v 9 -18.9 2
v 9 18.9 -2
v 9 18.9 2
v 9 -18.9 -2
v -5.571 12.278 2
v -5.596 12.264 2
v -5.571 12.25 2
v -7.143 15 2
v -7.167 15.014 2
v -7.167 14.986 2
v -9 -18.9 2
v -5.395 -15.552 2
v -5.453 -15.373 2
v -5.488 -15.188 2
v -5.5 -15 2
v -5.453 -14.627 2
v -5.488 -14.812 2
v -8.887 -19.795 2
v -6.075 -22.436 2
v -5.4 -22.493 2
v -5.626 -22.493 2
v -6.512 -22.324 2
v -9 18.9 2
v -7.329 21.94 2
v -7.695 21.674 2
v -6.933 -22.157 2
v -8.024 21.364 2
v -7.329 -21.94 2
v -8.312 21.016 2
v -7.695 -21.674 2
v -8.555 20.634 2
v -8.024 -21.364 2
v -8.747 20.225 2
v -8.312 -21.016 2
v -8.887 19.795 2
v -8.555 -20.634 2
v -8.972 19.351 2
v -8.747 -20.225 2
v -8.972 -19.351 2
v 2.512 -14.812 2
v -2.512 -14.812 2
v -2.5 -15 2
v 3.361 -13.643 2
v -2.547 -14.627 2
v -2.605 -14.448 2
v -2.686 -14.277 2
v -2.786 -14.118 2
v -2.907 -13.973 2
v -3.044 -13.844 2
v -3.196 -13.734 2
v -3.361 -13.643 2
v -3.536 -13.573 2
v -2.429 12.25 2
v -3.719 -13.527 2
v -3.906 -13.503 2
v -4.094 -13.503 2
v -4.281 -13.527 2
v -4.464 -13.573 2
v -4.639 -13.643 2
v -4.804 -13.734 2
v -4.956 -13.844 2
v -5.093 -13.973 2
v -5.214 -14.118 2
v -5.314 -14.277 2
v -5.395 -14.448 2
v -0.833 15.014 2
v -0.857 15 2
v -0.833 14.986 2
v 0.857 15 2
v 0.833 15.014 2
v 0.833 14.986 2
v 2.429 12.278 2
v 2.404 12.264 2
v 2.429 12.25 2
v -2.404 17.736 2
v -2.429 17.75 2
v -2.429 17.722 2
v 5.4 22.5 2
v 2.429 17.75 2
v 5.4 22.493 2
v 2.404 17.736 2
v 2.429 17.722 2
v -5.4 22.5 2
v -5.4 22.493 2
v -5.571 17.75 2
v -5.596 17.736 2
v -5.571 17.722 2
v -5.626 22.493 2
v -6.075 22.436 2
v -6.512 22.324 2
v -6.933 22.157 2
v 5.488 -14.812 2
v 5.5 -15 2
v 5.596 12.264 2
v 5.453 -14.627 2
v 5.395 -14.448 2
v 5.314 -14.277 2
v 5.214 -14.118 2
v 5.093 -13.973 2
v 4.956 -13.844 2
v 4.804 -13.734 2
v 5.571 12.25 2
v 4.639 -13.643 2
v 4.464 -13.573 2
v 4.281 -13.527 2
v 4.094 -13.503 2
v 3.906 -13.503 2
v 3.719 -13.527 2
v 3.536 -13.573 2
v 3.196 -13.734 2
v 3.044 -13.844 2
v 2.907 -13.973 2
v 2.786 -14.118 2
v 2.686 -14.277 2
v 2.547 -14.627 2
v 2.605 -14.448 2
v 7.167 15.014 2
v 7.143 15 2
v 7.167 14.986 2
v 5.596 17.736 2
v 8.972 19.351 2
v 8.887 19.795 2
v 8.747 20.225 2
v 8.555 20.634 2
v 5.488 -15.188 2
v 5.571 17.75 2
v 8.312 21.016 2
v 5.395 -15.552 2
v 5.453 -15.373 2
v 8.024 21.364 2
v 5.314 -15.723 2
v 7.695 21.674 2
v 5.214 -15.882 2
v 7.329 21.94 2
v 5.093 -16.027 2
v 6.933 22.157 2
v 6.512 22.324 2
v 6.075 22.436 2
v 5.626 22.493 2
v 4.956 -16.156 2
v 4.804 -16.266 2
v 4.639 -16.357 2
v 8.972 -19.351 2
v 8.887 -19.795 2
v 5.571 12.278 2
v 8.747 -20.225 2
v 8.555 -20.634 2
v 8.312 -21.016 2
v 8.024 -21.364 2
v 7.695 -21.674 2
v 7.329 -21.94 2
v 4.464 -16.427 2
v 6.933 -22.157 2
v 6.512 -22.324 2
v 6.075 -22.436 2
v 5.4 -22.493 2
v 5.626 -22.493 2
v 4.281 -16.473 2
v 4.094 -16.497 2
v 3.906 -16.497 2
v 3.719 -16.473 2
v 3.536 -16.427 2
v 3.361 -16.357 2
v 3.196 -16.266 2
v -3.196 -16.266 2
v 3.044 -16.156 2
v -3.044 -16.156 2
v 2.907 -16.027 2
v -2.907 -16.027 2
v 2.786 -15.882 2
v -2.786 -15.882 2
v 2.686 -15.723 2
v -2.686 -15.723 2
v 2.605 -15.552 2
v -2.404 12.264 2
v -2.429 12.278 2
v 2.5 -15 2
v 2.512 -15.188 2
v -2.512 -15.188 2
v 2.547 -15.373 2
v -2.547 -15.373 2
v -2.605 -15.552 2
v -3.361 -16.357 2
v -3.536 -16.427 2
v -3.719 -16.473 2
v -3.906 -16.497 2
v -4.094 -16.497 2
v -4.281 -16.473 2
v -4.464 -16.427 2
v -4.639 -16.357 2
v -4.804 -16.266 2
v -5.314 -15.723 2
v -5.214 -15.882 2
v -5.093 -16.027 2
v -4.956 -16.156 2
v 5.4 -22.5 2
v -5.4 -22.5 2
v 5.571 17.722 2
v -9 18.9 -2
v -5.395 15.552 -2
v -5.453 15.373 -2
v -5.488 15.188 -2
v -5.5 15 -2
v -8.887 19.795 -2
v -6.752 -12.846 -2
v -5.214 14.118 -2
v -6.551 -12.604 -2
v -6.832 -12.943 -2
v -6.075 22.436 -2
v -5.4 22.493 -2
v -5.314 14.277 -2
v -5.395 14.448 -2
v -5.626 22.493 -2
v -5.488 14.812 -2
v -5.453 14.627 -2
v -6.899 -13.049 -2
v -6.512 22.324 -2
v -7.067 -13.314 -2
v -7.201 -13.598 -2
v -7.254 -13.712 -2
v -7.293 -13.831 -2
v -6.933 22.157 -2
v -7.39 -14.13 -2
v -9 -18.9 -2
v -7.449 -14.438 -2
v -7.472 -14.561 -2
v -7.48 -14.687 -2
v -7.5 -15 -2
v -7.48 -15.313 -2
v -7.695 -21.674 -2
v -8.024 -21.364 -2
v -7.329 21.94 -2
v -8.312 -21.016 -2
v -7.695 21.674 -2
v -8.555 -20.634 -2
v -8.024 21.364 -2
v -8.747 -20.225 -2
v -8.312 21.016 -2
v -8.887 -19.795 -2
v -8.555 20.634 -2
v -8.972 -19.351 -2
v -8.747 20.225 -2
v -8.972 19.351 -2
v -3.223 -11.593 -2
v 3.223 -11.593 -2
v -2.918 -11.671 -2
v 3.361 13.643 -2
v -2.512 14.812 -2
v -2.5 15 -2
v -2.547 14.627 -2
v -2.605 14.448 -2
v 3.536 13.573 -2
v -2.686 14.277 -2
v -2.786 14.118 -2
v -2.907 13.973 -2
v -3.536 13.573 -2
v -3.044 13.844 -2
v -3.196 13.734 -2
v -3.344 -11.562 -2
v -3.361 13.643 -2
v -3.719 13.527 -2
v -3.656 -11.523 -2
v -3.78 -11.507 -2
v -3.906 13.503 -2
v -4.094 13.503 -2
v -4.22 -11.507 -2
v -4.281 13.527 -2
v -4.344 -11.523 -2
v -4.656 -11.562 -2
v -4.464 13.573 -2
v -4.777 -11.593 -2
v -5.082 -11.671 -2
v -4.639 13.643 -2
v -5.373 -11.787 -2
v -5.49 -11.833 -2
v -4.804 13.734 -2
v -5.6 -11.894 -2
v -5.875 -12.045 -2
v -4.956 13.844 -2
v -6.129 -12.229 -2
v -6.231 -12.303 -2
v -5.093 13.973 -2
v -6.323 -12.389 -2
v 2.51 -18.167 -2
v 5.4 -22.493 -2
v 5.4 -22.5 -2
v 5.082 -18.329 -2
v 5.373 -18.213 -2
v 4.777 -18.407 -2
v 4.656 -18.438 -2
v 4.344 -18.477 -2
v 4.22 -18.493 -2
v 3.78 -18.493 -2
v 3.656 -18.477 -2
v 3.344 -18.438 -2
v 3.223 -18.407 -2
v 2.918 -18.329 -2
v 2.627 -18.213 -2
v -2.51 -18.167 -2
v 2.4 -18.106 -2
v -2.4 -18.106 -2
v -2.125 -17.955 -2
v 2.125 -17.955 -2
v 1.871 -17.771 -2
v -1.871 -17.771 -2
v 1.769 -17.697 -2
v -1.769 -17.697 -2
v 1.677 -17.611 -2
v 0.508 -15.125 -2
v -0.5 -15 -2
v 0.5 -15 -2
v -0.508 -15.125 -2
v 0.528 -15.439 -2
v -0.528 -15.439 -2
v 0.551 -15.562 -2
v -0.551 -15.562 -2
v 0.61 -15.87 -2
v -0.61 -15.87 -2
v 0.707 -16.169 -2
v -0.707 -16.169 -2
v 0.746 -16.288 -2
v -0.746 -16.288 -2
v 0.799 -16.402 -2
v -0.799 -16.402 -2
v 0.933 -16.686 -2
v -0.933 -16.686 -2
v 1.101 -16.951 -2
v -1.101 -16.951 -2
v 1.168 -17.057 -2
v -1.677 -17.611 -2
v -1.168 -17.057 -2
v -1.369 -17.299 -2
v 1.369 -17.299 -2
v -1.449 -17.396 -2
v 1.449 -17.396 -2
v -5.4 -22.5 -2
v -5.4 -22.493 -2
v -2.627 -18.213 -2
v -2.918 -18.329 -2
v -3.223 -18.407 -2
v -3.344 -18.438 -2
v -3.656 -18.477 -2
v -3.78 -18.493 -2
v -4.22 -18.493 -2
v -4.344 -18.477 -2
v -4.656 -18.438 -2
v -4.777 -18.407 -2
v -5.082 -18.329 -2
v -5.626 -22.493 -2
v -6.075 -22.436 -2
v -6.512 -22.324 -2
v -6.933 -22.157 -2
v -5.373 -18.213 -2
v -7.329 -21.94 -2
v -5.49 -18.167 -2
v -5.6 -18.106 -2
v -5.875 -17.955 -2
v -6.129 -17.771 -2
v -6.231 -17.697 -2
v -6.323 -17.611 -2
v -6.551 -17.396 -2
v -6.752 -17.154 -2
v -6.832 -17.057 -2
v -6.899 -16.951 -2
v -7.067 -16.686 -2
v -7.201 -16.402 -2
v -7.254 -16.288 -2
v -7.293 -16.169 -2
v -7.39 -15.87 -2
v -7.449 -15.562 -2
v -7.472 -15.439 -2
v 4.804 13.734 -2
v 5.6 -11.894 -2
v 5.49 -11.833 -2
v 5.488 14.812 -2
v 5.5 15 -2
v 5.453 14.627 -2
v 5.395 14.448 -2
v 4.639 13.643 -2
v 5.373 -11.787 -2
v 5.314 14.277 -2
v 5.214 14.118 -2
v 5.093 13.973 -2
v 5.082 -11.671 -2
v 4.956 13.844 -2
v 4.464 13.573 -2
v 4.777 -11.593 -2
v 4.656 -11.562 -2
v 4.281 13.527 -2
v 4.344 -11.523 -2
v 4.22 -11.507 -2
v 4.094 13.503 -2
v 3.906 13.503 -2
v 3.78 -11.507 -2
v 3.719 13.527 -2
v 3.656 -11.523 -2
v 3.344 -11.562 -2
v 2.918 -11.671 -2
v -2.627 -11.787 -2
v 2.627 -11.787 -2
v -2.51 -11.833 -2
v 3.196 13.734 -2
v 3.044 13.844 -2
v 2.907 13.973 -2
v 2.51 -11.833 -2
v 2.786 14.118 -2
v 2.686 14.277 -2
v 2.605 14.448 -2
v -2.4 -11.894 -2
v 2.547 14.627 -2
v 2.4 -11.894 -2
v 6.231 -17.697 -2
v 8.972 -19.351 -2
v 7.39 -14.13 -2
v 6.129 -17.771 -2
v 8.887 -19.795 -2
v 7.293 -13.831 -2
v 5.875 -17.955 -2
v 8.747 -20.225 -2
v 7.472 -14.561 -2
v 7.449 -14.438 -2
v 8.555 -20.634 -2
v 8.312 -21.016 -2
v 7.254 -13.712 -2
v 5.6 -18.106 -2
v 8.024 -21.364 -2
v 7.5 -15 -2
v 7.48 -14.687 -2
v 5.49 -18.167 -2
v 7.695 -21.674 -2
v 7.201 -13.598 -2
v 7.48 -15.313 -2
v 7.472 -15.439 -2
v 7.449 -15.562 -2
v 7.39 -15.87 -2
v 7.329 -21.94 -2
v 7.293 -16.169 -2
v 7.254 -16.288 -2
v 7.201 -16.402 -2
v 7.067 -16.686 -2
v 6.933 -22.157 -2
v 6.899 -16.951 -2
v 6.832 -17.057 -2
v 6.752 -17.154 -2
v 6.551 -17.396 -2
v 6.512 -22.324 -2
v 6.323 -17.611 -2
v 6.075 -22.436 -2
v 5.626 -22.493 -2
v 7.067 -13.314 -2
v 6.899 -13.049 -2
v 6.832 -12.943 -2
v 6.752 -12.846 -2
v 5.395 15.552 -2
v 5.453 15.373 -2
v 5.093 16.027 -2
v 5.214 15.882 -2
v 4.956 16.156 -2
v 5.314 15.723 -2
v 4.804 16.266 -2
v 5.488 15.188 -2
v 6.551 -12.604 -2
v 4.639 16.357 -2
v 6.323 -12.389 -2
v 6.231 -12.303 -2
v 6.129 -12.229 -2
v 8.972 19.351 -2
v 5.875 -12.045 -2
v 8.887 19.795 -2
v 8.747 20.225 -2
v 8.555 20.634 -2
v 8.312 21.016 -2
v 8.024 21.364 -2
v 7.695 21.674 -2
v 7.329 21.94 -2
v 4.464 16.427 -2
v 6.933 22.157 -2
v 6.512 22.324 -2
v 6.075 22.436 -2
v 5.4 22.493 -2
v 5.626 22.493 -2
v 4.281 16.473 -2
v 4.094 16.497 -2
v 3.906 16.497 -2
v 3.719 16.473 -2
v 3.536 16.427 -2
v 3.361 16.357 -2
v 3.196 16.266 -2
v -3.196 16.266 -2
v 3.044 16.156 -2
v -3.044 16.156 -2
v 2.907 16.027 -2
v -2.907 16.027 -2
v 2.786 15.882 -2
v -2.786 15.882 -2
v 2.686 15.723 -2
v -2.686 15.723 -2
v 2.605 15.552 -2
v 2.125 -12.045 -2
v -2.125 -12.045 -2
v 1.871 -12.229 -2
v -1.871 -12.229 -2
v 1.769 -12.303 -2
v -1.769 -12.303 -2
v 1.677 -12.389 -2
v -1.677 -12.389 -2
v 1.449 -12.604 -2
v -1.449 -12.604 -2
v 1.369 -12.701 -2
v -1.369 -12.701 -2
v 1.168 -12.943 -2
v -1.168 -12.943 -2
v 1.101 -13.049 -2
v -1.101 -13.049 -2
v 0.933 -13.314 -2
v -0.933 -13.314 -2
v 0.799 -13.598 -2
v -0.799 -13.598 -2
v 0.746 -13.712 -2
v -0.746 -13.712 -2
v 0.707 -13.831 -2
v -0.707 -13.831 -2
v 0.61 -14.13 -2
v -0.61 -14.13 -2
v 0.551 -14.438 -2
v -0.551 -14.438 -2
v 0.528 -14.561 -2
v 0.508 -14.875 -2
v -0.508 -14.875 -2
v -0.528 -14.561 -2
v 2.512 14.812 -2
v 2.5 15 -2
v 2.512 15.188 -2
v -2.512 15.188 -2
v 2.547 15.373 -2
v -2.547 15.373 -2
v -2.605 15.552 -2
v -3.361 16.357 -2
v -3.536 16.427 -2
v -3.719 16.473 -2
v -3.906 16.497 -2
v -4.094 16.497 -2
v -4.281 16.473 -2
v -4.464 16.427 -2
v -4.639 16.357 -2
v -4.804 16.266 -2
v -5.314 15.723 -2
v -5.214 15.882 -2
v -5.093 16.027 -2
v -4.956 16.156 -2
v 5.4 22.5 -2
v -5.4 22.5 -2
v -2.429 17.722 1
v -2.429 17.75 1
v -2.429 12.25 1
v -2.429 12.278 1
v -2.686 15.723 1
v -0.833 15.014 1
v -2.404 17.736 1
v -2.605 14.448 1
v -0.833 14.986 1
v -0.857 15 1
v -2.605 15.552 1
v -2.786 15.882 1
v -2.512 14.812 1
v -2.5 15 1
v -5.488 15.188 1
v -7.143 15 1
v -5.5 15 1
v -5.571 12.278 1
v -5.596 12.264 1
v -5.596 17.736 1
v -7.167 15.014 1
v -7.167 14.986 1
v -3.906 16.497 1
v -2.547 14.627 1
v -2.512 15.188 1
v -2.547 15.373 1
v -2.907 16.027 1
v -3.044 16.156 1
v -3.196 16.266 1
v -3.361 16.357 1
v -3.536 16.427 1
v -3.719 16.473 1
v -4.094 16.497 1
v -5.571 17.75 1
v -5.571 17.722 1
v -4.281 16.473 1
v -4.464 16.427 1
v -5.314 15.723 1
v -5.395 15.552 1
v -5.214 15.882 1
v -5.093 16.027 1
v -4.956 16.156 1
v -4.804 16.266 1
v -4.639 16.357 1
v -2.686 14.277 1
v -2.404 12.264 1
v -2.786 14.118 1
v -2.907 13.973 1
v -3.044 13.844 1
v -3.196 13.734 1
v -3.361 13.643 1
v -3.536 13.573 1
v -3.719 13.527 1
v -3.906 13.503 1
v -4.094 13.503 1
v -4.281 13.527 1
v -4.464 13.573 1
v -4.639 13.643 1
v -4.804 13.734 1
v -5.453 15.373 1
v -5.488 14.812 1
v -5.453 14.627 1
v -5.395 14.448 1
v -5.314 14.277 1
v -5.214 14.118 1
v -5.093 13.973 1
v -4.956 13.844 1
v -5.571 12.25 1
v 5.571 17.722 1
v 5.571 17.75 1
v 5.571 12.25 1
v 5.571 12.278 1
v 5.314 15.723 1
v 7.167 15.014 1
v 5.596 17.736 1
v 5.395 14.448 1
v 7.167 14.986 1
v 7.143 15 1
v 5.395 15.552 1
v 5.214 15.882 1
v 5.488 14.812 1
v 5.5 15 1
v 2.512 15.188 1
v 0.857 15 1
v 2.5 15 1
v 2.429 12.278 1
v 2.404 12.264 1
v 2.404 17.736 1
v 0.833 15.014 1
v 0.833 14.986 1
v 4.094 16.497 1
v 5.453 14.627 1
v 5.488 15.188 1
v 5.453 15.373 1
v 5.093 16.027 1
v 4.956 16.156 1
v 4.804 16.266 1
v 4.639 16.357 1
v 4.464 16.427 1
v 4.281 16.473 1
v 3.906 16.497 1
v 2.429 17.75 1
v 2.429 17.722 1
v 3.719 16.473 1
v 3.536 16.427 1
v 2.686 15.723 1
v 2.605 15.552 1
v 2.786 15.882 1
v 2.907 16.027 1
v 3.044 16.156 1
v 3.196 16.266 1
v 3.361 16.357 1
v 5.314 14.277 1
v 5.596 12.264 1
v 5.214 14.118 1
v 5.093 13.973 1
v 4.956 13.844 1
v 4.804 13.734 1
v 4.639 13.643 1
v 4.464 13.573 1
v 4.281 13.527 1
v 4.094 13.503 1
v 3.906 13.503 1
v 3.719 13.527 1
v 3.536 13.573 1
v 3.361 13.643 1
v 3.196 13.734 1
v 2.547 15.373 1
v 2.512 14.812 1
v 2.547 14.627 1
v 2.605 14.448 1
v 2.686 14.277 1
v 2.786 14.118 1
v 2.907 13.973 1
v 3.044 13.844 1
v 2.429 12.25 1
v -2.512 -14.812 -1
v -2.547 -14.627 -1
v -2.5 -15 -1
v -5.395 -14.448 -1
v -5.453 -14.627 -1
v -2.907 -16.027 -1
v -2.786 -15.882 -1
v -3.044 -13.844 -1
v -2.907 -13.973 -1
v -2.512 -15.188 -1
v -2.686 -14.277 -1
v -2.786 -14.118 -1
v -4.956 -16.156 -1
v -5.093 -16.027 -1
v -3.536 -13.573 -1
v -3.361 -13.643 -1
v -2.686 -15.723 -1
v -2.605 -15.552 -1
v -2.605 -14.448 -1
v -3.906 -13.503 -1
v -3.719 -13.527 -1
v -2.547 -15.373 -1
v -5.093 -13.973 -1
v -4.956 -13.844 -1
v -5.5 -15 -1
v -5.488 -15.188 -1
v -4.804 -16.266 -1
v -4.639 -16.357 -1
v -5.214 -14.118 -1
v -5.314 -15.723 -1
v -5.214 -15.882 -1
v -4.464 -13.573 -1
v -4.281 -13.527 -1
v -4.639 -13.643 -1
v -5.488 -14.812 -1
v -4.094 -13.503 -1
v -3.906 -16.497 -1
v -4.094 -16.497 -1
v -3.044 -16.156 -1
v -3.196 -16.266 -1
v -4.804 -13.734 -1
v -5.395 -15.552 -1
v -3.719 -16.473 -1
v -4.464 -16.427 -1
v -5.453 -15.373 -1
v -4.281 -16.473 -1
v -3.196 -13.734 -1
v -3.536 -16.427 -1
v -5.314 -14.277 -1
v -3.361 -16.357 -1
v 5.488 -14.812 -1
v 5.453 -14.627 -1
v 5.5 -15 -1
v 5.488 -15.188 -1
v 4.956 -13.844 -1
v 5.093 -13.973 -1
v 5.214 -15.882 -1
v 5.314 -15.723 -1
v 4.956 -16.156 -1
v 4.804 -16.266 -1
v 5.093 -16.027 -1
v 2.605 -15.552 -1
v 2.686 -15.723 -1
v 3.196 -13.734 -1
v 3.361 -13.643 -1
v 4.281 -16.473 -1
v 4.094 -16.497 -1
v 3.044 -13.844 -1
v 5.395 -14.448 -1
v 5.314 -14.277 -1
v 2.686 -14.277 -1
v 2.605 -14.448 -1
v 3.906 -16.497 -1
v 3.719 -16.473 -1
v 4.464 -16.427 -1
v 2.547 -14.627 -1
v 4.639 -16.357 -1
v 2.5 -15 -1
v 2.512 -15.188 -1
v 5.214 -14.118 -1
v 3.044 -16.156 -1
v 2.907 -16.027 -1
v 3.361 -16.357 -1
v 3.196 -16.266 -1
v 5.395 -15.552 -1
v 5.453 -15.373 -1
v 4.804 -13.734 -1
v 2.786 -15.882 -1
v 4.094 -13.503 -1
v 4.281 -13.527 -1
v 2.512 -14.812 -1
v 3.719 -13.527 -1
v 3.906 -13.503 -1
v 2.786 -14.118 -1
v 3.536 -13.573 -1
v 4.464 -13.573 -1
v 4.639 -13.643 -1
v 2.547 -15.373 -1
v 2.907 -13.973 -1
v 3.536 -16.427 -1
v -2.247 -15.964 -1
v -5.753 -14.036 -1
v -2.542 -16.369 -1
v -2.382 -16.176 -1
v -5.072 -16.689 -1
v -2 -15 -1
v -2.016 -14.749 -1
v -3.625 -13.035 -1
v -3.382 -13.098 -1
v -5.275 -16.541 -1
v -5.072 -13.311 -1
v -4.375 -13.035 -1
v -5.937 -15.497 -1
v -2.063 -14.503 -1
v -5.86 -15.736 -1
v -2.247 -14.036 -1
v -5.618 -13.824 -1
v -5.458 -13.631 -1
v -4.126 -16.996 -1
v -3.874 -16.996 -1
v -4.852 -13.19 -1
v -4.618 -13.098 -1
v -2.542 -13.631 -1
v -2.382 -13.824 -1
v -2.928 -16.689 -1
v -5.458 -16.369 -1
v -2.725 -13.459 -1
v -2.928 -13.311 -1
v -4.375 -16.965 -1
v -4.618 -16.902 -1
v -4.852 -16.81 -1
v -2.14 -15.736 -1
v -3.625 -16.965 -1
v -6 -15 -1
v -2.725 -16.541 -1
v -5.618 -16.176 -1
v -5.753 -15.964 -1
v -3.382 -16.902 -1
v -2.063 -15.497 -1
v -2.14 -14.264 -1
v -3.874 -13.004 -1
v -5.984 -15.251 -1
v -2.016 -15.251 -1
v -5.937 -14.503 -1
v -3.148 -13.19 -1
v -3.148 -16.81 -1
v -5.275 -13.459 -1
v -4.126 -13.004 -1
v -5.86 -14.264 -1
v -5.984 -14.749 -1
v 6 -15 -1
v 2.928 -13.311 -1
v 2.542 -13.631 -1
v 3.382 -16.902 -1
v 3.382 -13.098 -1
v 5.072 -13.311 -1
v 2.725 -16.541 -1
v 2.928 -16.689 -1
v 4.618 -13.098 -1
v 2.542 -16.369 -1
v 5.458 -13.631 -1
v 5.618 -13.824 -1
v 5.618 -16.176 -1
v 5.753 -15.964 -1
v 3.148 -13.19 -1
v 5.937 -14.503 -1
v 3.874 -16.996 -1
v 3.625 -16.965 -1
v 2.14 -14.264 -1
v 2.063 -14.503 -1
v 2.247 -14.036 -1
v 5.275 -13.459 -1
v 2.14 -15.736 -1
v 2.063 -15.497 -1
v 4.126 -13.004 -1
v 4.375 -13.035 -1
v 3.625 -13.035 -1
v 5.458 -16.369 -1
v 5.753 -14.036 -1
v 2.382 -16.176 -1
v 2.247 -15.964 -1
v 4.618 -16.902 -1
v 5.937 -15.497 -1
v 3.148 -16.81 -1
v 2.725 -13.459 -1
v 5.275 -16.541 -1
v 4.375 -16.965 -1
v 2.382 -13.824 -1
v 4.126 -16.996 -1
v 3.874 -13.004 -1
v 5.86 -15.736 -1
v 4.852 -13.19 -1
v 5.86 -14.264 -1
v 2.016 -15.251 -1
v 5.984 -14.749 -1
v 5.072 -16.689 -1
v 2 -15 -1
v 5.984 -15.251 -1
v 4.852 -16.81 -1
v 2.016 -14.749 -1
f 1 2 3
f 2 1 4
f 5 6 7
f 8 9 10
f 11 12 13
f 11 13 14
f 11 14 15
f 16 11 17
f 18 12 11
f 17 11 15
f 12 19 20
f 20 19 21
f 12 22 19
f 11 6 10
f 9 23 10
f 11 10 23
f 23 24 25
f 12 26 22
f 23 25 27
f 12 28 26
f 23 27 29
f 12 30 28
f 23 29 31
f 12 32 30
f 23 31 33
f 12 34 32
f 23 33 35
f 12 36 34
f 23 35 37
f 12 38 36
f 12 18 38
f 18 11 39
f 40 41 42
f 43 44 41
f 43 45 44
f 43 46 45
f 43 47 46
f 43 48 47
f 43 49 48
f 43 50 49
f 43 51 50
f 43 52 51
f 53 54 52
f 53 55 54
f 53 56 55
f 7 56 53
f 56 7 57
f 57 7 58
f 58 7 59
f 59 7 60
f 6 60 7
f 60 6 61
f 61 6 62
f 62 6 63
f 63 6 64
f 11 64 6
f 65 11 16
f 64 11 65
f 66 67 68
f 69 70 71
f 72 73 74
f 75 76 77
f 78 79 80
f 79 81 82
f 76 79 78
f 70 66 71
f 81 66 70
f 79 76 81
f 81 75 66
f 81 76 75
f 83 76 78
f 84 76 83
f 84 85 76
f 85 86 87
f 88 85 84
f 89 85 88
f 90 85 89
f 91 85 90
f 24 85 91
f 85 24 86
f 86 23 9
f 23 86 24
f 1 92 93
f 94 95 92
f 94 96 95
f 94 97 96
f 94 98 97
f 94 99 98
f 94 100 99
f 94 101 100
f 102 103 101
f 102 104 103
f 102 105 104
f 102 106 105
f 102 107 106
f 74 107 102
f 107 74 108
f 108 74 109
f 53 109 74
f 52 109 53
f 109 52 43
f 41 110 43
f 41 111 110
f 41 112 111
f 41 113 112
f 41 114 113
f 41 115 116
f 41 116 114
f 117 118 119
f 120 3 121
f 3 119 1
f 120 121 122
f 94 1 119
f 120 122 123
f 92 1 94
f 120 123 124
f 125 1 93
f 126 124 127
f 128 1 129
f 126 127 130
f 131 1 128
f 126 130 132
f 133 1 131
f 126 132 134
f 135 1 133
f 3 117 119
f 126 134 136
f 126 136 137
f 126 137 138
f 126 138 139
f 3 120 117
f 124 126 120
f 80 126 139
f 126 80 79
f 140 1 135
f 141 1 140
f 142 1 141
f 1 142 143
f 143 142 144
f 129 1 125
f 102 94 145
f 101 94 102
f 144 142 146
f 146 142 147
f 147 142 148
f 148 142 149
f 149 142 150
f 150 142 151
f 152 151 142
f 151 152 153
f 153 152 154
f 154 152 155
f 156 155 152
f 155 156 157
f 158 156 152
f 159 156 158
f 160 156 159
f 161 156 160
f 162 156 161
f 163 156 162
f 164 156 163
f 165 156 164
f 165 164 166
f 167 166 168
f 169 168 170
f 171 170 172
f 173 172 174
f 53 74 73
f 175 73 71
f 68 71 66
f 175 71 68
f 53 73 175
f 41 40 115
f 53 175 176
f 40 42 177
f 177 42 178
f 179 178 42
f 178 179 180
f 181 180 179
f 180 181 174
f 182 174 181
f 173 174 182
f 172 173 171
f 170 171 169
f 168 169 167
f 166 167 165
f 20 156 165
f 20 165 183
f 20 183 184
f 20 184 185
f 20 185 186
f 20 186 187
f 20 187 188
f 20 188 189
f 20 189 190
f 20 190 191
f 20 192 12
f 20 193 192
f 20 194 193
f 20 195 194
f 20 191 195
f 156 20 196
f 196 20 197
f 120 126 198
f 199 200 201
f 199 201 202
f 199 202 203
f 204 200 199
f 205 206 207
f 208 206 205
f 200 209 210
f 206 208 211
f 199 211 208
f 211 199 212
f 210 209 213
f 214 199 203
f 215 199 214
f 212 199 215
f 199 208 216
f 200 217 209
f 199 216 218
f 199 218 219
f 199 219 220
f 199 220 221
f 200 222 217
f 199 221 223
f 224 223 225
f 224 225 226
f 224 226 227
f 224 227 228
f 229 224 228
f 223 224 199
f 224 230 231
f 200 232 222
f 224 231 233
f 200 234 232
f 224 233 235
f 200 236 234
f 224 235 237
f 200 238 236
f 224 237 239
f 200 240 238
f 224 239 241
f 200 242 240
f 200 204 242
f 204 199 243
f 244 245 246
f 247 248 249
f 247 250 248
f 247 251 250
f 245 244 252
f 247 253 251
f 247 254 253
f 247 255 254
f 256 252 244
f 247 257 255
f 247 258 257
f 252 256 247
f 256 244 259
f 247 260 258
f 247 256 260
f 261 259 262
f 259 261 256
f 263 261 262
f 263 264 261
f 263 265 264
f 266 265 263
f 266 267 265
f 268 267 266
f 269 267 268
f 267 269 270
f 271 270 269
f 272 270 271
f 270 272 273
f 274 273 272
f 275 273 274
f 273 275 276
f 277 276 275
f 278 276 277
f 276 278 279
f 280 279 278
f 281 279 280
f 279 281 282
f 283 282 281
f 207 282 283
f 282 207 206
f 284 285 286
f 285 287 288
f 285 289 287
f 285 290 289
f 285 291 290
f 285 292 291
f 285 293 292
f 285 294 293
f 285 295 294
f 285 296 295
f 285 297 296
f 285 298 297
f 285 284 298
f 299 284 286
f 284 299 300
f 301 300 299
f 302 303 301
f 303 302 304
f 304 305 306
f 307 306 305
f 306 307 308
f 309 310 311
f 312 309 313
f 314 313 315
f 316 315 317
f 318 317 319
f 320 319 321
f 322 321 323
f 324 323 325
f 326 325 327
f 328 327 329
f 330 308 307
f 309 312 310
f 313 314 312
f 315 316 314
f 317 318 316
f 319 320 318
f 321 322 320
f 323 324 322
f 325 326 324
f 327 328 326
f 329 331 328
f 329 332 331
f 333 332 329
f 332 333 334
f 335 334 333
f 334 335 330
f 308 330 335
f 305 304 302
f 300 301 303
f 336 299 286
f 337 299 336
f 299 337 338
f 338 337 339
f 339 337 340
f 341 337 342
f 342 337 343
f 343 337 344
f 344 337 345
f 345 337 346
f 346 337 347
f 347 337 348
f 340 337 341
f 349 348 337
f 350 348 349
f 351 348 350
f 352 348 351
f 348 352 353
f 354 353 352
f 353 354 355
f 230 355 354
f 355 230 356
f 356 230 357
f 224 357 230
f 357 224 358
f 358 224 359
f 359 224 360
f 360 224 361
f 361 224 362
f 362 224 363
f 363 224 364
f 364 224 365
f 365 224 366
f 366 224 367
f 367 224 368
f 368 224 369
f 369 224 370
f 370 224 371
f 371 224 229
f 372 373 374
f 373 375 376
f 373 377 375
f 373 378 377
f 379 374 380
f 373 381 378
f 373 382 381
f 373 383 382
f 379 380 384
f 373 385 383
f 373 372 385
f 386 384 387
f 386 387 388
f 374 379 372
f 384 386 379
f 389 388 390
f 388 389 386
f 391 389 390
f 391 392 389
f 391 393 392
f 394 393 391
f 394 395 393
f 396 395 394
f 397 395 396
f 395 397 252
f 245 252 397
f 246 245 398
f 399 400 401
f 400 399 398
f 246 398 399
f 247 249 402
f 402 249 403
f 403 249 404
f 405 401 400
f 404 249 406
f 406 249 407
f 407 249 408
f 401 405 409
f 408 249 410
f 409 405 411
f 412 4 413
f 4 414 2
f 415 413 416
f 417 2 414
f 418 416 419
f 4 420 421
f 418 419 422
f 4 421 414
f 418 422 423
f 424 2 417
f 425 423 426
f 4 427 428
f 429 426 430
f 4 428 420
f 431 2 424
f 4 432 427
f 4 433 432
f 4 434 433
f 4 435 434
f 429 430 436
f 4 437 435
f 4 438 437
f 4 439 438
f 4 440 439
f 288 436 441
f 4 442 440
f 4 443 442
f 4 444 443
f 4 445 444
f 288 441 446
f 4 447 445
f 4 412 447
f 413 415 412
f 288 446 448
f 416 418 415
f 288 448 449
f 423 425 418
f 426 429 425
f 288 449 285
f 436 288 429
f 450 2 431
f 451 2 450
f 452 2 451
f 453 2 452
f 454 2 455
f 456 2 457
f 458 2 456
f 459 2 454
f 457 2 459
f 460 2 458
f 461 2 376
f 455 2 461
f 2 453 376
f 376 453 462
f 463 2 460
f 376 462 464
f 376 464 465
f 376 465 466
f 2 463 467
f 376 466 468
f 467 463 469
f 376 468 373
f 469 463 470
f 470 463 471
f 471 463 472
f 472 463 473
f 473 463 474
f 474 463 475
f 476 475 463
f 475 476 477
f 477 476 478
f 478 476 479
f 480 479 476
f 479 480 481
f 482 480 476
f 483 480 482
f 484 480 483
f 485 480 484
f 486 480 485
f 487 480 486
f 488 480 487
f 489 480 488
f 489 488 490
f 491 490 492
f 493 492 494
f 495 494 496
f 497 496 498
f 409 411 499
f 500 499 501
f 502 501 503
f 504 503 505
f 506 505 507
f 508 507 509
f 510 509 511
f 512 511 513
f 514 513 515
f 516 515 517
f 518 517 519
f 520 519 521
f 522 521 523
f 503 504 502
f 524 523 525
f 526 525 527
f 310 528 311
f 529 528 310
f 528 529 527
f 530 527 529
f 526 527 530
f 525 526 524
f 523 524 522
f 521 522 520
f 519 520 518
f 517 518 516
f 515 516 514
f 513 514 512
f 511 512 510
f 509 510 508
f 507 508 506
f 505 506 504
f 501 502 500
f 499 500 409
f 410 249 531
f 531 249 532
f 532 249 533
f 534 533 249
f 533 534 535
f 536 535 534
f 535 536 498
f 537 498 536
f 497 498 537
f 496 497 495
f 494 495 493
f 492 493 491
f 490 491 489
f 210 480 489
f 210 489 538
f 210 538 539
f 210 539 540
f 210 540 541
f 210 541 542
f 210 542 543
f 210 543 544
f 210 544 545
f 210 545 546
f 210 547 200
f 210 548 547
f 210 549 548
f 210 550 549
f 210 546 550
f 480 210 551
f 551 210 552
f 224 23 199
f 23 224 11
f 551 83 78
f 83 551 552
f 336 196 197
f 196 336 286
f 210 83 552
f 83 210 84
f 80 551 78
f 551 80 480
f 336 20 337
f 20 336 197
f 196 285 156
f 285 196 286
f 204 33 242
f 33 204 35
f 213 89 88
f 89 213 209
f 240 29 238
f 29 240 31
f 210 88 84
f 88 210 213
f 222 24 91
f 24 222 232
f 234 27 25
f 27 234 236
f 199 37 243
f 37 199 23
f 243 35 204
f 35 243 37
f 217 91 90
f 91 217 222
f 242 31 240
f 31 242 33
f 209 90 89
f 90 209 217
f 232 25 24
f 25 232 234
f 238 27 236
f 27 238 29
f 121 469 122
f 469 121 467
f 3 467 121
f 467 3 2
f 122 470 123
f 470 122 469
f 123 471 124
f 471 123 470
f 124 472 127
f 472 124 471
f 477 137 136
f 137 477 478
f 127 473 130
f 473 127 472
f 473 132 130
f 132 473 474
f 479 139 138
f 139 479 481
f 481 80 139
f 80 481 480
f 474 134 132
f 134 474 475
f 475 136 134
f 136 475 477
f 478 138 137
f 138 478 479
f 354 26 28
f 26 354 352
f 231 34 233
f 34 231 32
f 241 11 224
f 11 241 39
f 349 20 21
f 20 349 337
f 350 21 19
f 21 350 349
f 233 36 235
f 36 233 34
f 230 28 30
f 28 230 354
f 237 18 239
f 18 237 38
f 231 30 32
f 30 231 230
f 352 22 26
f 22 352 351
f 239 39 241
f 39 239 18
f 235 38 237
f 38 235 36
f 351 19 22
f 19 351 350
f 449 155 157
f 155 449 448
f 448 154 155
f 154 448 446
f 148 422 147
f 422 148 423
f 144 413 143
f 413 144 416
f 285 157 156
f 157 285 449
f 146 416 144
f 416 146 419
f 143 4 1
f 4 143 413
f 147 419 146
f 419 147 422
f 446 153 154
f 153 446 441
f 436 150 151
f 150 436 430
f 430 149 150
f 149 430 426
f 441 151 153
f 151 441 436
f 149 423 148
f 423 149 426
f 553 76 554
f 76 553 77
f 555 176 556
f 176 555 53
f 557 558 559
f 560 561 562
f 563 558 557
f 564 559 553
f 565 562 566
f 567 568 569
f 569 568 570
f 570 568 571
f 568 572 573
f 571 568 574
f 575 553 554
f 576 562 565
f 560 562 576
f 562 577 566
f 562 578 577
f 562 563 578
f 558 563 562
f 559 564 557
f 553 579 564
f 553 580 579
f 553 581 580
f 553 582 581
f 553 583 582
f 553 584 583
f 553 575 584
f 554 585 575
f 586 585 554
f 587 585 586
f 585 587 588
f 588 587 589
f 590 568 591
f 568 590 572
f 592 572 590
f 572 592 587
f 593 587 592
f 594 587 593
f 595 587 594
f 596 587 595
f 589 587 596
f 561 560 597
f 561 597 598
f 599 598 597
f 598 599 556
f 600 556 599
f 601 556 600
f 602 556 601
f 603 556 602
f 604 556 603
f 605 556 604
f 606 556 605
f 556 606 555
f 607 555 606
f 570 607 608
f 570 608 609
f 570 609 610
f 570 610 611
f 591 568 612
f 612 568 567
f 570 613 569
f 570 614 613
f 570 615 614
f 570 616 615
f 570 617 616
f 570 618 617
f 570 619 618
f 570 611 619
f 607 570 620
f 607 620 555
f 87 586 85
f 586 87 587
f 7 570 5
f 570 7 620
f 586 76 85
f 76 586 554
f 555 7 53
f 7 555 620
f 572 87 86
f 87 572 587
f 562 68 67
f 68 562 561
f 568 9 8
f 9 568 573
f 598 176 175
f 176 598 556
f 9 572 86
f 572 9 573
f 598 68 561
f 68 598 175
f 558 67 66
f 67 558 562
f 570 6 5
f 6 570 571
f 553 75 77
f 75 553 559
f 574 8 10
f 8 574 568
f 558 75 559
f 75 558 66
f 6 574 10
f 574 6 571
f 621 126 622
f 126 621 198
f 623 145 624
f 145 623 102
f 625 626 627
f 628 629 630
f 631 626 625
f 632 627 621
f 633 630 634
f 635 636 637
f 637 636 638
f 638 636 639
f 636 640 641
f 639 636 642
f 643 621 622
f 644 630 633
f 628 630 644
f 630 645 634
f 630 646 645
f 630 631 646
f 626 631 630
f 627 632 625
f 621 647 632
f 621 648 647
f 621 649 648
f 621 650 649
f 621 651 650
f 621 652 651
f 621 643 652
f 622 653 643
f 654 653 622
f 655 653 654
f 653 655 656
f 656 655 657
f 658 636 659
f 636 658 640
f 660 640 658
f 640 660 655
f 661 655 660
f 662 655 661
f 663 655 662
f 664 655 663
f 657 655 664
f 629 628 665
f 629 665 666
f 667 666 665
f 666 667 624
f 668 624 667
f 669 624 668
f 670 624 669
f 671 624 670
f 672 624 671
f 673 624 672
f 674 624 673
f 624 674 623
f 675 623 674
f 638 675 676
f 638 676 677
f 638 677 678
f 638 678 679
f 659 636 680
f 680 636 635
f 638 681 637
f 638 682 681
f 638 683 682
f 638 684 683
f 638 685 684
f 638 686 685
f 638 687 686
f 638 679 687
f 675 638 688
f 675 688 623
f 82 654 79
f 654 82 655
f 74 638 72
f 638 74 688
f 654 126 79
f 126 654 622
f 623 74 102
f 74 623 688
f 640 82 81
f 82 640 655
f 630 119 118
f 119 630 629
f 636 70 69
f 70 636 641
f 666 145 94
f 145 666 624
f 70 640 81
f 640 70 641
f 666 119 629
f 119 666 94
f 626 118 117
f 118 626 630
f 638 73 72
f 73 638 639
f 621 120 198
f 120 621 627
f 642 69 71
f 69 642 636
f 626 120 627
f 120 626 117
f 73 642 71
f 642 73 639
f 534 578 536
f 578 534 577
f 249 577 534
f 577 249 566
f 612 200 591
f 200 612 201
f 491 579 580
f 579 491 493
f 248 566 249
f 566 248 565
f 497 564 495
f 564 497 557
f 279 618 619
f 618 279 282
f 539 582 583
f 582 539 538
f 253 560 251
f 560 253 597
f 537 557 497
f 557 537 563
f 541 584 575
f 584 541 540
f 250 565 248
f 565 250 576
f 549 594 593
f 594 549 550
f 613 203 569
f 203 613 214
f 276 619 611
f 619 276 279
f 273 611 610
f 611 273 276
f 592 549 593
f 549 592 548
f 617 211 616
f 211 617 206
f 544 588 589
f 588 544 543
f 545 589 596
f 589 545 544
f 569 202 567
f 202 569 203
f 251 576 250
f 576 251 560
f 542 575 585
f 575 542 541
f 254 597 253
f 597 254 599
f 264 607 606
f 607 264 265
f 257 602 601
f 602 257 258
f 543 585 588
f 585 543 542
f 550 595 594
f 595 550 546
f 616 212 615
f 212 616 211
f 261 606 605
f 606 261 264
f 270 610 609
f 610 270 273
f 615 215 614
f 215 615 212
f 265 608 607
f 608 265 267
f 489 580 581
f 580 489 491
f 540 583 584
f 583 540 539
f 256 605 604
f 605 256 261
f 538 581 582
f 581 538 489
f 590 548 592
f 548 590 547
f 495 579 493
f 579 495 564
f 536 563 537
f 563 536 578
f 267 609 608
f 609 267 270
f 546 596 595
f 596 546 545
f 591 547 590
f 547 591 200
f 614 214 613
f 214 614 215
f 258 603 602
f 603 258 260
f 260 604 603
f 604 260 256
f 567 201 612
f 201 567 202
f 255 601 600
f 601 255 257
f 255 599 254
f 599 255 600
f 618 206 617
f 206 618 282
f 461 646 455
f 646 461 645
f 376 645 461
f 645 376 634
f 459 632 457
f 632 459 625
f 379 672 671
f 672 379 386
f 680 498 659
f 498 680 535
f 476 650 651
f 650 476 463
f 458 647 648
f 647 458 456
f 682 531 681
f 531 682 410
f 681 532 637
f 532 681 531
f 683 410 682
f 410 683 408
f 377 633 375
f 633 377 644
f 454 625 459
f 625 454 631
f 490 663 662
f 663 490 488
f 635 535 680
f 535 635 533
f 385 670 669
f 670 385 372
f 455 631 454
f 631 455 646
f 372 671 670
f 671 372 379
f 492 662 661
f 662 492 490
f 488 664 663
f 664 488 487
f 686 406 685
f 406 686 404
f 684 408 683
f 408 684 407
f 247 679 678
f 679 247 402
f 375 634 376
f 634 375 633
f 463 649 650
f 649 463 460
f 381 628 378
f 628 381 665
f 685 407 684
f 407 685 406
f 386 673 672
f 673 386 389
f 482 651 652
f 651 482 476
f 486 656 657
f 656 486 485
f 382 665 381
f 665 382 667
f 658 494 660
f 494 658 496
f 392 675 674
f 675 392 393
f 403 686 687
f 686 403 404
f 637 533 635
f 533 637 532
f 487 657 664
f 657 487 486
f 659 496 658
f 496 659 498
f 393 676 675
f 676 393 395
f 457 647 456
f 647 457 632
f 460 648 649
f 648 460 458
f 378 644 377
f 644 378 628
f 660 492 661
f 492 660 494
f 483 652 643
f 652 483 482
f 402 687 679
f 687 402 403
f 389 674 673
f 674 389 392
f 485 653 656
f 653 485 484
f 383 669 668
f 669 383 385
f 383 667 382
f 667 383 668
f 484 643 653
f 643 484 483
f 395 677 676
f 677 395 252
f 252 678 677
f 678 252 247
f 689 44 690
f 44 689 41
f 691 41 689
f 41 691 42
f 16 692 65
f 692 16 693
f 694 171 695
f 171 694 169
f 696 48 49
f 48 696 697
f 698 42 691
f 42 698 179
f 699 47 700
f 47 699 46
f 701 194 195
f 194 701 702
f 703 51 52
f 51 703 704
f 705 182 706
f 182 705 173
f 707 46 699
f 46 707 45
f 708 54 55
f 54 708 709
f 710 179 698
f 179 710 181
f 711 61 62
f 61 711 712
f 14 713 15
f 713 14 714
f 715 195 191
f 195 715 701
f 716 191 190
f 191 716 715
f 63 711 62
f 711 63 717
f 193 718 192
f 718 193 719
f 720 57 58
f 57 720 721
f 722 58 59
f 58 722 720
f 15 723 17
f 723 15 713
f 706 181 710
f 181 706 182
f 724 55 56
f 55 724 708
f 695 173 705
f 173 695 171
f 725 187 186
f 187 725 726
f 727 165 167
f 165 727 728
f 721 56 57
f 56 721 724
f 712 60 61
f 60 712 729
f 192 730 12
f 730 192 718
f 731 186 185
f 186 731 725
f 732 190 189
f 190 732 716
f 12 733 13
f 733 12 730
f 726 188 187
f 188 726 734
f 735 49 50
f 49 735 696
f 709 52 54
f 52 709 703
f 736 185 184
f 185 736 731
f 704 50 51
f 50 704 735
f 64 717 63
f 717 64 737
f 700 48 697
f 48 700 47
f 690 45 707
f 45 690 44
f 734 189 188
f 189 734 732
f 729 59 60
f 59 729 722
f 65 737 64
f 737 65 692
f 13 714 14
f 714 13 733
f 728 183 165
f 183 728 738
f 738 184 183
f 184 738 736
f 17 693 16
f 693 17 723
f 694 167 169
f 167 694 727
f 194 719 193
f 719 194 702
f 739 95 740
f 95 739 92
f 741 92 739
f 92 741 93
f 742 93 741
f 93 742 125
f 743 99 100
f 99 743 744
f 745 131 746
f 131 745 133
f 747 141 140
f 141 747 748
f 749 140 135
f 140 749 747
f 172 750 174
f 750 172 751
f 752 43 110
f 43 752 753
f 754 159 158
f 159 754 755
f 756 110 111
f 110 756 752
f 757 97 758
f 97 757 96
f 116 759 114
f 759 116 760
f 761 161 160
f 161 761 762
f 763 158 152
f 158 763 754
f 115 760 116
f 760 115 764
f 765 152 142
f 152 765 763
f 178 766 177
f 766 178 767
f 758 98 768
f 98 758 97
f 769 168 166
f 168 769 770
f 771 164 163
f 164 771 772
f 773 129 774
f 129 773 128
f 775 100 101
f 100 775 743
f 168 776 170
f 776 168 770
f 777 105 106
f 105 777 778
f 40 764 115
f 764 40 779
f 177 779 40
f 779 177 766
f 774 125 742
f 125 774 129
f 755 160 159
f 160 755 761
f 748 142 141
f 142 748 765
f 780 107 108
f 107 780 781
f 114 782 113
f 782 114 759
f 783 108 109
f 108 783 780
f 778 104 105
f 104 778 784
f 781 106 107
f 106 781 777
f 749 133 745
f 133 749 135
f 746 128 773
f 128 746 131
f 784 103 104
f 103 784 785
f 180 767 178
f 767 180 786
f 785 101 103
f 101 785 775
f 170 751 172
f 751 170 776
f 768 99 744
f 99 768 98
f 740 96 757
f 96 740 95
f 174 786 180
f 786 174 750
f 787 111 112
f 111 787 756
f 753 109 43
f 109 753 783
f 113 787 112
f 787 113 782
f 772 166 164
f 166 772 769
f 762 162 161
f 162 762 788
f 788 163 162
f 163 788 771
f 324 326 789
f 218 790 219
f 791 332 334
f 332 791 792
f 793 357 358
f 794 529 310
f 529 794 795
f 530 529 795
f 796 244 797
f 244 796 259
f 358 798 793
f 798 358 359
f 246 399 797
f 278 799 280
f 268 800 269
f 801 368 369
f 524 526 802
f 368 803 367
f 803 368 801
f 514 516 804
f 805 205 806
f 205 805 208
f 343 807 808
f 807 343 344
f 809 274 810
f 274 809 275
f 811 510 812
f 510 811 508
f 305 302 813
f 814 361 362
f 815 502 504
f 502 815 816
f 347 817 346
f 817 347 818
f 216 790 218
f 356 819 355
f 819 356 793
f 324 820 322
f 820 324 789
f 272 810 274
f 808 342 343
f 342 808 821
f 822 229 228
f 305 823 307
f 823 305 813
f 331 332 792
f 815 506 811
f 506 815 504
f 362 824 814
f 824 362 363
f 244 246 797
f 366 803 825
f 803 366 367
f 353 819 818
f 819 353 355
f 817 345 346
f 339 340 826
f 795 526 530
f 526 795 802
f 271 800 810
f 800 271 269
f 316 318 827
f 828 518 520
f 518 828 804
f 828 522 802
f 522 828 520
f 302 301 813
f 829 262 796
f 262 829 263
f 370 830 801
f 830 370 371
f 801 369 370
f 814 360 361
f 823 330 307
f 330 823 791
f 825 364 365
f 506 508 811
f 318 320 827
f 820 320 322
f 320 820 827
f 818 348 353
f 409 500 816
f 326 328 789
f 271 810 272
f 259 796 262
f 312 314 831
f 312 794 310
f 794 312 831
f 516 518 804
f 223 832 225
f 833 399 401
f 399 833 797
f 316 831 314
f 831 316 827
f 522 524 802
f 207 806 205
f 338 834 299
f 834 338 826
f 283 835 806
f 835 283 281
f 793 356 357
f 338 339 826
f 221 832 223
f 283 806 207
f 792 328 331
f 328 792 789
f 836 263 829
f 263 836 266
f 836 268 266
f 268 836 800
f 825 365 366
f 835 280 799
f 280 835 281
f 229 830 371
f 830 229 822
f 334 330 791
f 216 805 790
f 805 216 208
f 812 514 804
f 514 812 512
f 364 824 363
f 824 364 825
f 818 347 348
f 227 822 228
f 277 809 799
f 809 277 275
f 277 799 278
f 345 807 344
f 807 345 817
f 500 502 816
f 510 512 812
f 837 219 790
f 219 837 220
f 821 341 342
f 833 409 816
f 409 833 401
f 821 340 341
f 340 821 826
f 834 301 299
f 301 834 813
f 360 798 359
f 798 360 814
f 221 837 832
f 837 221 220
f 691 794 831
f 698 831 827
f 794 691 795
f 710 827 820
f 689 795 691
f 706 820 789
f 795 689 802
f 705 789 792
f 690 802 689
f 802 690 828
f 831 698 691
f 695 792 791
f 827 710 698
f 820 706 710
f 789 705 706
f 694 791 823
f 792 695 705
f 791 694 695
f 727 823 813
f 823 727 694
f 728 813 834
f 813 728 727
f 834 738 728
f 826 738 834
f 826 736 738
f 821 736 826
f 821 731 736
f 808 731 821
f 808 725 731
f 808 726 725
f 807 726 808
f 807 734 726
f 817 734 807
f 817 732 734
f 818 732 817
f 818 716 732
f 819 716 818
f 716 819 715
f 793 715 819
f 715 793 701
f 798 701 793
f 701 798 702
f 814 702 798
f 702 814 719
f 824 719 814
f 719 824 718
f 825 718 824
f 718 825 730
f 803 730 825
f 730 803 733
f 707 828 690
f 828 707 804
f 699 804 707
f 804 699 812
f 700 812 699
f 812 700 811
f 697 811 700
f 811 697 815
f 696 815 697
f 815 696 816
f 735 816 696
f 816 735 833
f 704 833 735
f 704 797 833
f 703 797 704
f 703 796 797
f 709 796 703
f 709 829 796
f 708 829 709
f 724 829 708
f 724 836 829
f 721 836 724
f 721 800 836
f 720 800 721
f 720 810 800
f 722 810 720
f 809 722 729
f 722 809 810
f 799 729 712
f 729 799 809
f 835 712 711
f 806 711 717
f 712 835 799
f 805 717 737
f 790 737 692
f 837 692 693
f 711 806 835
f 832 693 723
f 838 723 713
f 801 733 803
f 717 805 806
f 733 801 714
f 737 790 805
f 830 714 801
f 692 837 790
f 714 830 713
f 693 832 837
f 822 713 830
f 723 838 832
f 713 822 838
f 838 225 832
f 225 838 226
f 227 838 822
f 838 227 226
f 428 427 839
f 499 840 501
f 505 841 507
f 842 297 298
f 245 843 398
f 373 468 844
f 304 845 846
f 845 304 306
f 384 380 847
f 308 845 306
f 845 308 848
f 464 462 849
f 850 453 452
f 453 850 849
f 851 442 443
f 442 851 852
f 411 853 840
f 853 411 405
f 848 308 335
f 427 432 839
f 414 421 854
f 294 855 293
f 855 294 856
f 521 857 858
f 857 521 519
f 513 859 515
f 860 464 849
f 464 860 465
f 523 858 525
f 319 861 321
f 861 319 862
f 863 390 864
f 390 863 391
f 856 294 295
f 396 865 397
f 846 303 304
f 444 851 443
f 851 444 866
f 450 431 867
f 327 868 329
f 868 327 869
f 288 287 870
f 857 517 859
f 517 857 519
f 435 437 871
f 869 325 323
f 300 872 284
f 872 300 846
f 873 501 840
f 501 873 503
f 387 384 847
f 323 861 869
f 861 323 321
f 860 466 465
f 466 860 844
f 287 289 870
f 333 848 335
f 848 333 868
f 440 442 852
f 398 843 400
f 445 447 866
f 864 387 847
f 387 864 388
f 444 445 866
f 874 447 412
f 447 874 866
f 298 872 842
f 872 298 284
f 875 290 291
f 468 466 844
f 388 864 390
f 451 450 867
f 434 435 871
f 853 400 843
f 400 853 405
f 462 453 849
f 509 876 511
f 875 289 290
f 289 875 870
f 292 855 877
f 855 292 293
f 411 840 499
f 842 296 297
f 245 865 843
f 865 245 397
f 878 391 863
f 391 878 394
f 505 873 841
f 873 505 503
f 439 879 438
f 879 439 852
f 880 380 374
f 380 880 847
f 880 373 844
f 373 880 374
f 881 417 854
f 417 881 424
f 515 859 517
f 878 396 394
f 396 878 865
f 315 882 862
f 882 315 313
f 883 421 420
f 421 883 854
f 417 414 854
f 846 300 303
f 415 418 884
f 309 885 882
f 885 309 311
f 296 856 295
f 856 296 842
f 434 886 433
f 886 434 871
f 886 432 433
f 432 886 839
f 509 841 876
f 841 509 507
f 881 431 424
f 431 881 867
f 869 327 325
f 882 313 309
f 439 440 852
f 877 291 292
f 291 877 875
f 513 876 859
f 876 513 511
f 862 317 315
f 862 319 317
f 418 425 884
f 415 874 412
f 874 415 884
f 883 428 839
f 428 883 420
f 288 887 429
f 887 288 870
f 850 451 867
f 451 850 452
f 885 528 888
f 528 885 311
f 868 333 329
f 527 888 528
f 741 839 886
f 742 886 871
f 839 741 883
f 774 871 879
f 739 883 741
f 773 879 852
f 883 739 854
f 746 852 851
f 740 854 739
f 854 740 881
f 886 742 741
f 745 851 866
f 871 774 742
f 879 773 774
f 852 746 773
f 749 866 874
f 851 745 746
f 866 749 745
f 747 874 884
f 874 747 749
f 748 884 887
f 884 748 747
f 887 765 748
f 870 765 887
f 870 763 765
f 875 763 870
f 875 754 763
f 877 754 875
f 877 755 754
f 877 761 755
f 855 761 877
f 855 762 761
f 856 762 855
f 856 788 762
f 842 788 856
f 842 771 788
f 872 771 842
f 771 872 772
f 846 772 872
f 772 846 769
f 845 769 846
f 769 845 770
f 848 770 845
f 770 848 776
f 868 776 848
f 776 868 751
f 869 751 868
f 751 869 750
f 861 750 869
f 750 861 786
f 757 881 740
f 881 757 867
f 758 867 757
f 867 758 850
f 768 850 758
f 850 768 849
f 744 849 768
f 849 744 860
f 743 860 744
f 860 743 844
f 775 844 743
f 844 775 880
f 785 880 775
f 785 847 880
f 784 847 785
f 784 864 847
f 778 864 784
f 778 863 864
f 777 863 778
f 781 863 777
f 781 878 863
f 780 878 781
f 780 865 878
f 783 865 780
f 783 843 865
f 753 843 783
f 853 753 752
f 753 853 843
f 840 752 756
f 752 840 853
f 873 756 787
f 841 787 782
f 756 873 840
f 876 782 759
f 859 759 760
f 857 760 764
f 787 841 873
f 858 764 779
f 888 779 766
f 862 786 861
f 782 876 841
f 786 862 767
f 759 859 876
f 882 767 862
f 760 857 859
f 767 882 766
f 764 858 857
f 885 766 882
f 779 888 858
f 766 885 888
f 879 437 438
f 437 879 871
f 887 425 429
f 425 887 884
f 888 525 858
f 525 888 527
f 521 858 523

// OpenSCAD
// file: shapes.scad
/*
 *  OpenSCAD Shapes Library (www.openscad.at)
 *  Copyright (C) 2009  Catarina Mota <clifford@clifford.at>
 *
 *  This program is free software; you can redistribute it and/or modify
 *  it under the terms of the GNU General Public License as published by
 *  the Free Software Foundation; either version 2 of the License, or
 *  (at your option) any later version.
 *
 *  This program is distributed in the hope that it will be useful,
 *  but WITHOUT ANY WARRANTY; without even the implied warranty of
 *  MERCHANTABILITY or FITNESS FOR A PARTICULAR PURPOSE.  See the
 *  GNU General Public License for more details.
 *
 *  You should have received a copy of the GNU General Public License
 *  along with this program; if not, write to the Free Software
 *  Foundation, Inc., 59 Temple Place, Suite 330, Boston, MA  02111-1307  USA
 *
*/

module box(w,h,d) {
	scale ([w,h,d]) cube(1, true);
}

module roundedBox(w,h,d,f){
	difference(){
		box(w,h,d);
		translate([-w/2,h/2,0]) cube(w/(f/2),true);
		translate([w/2,h/2,0]) cube(w/(f/2),true);
		translate([-w/2,-h/2,0]) cube(w/(f/2),true);
		translate([w/2,-h/2,0]) cube(w/(f/2),true);
	}
	translate([-w/2+w/f,h/2-w/f,-d/2]) cylinder(d,w/f, w/f);
	translate([w/2-w/f,h/2-w/f,-d/2]) cylinder(d,w/f, w/f);
	translate([-w/2+w/f,-h/2+w/f,-d/2]) cylinder(d,w/f, w/f);
	translate([w/2-w/f,-h/2+w/f,-d/2]) cylinder(d,w/f, w/f);
}

module cone(height, radius) {
		cylinder(height, radius, 0);
}

module oval(w,h,d) {
	scale ([w/100, h/100, 1]) cylinder(d, 50, 50);
}

module tube(height, radius, wall) {
	difference(){
		cylinder(height, radius, radius);
		cylinder(height, radius-wall, radius-wall);
	}
}

module ovalTube(w,h,d,wall) {
	difference(){
		scale ([w/100, h/100, 1]) cylinder(d, 50, 50);
		scale ([w/100, h/100, 1]) cylinder(d, 50-wall, 50-wall);
	}
}

module hexagon(height, depth) {
	boxWidth=height/1.75;
		union(){
			box(boxWidth, height, depth);
			rotate([0,0,60]) box(boxWidth, height, depth);
			rotate([0,0,-60]) box(boxWidth, height, depth);
		}
}

module octagon(height, depth) {
	intersection(){
		box(height, height, depth);
		rotate([0,0,45]) box(height, height, depth);
	}
}

module dodecagon(height, depth) {
	intersection(){
		hexagon(height, depth);
		rotate([0,0,90]) hexagon(height, depth);
	}
}

module hexagram(height, depth) {
	boxWidth=height/1.75;
	intersection(){
		box(height, boxWidth, depth);
		rotate([0,0,60]) box(height, boxWidth, depth);
	}
	intersection(){
		box(height, boxWidth, depth);
		rotate([0,0,-60]) box(height, boxWidth, depth);
	}
	intersection(){
		rotate([0,0,60]) box(height, boxWidth, depth);
		rotate([0,0,-60]) box(height, boxWidth, depth);
	}
}

module rightTriangle(adjacent, opposite, depth) {
	difference(){
		translate([-adjacent/2,opposite/2,0]) box(adjacent, opposite, depth);
		translate([-adjacent,0,0]){
			rotate([0,0,atan(opposite/adjacent)]) dislocateBox(adjacent*2, opposite, depth);
		}
	}
}

module equiTriangle(side, depth) {
	difference(){
		translate([-side/2,side/2,0]) box(side, side, depth);
		rotate([0,0,30]) dislocateBox(side*2, side, depth);
		translate([-side,0,0]){
			rotate([0,0,60]) dislocateBox(side*2, side, depth);
		}
	}
}

module 12ptStar(height, depth) {
	starNum=3;
	starAngle=360/starNum;
	for (s=[1:starNum]){
		rotate([0, 0, s*starAngle]) box(height, height, depth);
	}
}

//-----------------------
//MOVES THE ROTATION AXIS OF A BOX FROM ITS CENTER TO THE BOTTOM LEFT CORNER
module dislocateBox(w,h,d){
	translate([w/2,h,0]){
		difference(){
			box(w, h*2, d+1);
			translate([-w,0,0]) box(w, h*2, d+1);
		}
	}
}
// main file
include <shapes.scad>;

SWITCH_GAP = 8;
THICKNESS = 4;
SPACE = 30;

$fn = 50;

module grip(offset) {
	// Holes
	translate([- SWITCH_GAP / 2, offset, -2]) cylinder(10, 1.5, 1.5);
	translate([SWITCH_GAP / 2, offset, -2]) cylinder(10, 1.5, 1.5);

	// Nut footprint
	translate([- SWITCH_GAP / 2, offset, 2]) hexagon(5.5, 2);
	translate([SWITCH_GAP / 2, offset, 2]) hexagon(5.5, 2);
}

module switch(offset) {
	// Holes
	translate([- SWITCH_GAP / 2, offset, -2]) cylinder(10, 1.5, 1.5);
	translate([SWITCH_GAP / 2, offset, -2]) cylinder(10, 1.5, 1.5);

	// Chamfer
	translate([-SWITCH_GAP / 2, offset, -3]) cylinder(2, 5, 2);
	translate([SWITCH_GAP / 2, offset, -3]) cylinder(2, 5, 2);
}

difference() {
	roundedBox(SWITCH_GAP + 10, SPACE + 15, THICKNESS, 5);
	grip(SPACE / 2);
	switch(-SPACE / 2);
}
